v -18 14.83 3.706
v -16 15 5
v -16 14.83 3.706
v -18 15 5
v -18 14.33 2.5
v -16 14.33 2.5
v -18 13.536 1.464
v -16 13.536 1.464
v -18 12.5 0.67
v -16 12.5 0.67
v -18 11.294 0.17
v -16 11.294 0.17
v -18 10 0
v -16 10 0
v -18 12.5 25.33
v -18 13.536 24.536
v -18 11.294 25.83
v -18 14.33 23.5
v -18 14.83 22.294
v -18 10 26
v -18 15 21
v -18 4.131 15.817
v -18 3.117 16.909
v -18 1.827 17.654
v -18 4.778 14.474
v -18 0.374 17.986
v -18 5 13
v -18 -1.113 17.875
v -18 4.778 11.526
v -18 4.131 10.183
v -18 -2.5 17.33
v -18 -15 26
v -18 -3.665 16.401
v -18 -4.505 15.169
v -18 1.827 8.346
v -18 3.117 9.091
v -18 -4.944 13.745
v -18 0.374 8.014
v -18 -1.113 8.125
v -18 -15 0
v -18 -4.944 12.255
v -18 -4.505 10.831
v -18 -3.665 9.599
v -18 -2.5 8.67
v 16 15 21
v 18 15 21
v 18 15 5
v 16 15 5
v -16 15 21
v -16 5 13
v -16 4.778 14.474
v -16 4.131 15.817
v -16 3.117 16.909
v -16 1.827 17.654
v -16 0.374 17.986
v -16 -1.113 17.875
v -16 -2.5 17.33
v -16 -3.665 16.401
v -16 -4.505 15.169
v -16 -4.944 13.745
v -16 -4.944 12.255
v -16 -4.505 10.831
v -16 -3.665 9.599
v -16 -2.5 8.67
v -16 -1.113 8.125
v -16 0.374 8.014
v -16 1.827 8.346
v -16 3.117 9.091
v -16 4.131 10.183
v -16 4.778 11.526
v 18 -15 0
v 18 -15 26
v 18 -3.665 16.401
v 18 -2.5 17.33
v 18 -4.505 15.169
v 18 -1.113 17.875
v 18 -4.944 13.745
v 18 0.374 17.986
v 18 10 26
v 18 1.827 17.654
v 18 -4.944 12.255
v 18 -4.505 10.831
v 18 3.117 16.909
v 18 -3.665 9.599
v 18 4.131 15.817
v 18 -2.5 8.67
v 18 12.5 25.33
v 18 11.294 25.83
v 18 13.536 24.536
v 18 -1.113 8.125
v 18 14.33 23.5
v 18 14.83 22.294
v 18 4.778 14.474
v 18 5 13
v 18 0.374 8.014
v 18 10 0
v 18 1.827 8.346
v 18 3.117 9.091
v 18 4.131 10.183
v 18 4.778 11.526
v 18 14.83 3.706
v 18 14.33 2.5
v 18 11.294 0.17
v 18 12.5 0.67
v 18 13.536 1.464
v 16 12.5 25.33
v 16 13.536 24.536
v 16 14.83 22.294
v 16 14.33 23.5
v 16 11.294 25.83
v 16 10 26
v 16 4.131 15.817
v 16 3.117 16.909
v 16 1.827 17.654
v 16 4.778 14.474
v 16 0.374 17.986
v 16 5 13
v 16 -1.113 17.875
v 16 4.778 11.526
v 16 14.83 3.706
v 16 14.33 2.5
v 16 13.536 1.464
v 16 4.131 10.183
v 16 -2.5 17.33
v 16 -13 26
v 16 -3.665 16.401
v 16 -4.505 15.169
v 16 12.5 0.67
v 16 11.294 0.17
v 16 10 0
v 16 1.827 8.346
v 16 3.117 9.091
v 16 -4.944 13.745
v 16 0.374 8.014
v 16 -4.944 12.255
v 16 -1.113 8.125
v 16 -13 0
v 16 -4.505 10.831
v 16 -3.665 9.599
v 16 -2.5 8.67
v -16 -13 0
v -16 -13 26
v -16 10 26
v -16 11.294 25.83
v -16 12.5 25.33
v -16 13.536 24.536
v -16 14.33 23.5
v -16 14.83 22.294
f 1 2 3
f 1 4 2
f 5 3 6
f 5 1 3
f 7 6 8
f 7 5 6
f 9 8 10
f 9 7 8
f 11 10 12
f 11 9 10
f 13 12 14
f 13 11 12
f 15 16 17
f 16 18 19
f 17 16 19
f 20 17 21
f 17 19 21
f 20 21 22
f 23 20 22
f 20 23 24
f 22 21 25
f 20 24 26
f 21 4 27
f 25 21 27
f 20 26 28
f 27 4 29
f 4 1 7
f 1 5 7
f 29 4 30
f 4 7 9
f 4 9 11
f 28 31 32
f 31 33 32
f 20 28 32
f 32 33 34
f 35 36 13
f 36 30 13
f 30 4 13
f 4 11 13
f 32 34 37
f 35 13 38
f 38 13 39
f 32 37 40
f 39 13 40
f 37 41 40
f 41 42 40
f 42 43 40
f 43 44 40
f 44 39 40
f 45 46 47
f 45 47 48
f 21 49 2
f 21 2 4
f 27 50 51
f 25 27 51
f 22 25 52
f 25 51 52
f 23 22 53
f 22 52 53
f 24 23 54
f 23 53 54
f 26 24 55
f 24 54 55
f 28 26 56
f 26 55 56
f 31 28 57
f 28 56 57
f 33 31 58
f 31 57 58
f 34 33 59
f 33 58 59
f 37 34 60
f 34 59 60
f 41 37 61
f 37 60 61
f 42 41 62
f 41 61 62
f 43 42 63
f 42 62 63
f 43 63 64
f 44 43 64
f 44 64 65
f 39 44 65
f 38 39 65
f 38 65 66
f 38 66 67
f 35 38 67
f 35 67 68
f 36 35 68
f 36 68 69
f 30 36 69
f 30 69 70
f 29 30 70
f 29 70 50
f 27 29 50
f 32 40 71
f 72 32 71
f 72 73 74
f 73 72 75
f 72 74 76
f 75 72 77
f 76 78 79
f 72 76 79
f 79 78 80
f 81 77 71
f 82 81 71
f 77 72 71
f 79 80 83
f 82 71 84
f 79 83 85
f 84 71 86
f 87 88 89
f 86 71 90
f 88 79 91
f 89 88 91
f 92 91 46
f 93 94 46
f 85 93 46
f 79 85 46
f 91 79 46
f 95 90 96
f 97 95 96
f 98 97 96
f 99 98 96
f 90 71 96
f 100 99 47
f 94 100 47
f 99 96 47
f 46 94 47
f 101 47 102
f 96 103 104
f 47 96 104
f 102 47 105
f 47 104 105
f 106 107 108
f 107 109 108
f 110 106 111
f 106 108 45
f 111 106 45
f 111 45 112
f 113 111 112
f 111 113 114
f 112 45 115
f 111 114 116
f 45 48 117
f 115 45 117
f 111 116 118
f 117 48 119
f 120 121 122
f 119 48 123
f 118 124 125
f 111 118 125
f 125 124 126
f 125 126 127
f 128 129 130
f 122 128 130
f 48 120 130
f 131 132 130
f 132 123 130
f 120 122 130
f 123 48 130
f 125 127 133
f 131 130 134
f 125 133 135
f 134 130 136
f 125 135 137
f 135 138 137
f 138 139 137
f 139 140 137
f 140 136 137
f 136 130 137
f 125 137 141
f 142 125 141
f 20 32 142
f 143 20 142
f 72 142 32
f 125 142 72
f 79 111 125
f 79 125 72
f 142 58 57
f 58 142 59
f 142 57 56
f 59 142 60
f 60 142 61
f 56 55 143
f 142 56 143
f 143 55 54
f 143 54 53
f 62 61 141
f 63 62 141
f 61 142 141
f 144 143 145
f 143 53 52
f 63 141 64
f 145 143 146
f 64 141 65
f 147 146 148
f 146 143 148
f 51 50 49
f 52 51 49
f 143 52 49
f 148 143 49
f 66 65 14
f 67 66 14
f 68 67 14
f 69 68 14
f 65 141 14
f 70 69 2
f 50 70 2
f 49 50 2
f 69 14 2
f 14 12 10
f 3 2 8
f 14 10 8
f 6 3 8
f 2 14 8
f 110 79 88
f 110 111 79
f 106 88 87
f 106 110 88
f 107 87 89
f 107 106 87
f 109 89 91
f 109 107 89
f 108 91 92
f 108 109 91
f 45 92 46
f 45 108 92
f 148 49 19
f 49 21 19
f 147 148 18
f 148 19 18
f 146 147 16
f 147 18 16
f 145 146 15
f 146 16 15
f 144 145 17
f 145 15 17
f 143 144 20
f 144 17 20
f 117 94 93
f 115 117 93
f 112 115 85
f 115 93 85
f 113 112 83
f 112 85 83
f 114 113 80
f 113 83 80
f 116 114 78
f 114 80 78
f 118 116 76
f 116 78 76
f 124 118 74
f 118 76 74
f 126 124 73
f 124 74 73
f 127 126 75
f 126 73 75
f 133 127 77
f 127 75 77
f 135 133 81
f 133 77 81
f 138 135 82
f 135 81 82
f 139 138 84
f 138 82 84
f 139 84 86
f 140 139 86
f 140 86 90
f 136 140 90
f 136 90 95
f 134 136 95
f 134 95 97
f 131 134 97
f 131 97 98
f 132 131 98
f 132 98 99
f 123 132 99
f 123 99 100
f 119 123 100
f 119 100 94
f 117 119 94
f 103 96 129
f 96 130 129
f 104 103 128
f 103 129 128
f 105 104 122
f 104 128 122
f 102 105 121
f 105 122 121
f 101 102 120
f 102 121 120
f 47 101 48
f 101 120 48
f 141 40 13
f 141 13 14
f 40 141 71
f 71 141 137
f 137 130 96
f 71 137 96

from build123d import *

# Parameters (mm, degrees)
F1_DEPTH = 26
F2_R     = 5
F3_DEPTH = 36.001
F4_R     = 5


with BuildPart() as f1:
    # F0 (on Top) → F1 (new body)
    with BuildSketch(Plane.XY):
        Polygon((-16, 15), (-18, 15), (-18, -15), (18, -15), (18, 15), (16, 15), (16, -13), (-16, -13), align=None)
    extrude(amount=F1_DEPTH)

    # F2 (on face) → F3 (cut, through all)
    with BuildSketch(Plane.YZ.offset(18)):
        with Locations((0, 13)):
            Circle(F2_R)
    extrude(amount=-F3_DEPTH, mode=Mode.SUBTRACT)

    # F4
    f4_edges = [f1.edges().sort_by_distance(p)[0] for p in [
        (17, 15, 0),
        (-17, 15, 0),
        (-17, 15, 26),
        (17, 15, 26),
    ]]
    fillet(f4_edges, radius=F4_R)


solid = f1.part
